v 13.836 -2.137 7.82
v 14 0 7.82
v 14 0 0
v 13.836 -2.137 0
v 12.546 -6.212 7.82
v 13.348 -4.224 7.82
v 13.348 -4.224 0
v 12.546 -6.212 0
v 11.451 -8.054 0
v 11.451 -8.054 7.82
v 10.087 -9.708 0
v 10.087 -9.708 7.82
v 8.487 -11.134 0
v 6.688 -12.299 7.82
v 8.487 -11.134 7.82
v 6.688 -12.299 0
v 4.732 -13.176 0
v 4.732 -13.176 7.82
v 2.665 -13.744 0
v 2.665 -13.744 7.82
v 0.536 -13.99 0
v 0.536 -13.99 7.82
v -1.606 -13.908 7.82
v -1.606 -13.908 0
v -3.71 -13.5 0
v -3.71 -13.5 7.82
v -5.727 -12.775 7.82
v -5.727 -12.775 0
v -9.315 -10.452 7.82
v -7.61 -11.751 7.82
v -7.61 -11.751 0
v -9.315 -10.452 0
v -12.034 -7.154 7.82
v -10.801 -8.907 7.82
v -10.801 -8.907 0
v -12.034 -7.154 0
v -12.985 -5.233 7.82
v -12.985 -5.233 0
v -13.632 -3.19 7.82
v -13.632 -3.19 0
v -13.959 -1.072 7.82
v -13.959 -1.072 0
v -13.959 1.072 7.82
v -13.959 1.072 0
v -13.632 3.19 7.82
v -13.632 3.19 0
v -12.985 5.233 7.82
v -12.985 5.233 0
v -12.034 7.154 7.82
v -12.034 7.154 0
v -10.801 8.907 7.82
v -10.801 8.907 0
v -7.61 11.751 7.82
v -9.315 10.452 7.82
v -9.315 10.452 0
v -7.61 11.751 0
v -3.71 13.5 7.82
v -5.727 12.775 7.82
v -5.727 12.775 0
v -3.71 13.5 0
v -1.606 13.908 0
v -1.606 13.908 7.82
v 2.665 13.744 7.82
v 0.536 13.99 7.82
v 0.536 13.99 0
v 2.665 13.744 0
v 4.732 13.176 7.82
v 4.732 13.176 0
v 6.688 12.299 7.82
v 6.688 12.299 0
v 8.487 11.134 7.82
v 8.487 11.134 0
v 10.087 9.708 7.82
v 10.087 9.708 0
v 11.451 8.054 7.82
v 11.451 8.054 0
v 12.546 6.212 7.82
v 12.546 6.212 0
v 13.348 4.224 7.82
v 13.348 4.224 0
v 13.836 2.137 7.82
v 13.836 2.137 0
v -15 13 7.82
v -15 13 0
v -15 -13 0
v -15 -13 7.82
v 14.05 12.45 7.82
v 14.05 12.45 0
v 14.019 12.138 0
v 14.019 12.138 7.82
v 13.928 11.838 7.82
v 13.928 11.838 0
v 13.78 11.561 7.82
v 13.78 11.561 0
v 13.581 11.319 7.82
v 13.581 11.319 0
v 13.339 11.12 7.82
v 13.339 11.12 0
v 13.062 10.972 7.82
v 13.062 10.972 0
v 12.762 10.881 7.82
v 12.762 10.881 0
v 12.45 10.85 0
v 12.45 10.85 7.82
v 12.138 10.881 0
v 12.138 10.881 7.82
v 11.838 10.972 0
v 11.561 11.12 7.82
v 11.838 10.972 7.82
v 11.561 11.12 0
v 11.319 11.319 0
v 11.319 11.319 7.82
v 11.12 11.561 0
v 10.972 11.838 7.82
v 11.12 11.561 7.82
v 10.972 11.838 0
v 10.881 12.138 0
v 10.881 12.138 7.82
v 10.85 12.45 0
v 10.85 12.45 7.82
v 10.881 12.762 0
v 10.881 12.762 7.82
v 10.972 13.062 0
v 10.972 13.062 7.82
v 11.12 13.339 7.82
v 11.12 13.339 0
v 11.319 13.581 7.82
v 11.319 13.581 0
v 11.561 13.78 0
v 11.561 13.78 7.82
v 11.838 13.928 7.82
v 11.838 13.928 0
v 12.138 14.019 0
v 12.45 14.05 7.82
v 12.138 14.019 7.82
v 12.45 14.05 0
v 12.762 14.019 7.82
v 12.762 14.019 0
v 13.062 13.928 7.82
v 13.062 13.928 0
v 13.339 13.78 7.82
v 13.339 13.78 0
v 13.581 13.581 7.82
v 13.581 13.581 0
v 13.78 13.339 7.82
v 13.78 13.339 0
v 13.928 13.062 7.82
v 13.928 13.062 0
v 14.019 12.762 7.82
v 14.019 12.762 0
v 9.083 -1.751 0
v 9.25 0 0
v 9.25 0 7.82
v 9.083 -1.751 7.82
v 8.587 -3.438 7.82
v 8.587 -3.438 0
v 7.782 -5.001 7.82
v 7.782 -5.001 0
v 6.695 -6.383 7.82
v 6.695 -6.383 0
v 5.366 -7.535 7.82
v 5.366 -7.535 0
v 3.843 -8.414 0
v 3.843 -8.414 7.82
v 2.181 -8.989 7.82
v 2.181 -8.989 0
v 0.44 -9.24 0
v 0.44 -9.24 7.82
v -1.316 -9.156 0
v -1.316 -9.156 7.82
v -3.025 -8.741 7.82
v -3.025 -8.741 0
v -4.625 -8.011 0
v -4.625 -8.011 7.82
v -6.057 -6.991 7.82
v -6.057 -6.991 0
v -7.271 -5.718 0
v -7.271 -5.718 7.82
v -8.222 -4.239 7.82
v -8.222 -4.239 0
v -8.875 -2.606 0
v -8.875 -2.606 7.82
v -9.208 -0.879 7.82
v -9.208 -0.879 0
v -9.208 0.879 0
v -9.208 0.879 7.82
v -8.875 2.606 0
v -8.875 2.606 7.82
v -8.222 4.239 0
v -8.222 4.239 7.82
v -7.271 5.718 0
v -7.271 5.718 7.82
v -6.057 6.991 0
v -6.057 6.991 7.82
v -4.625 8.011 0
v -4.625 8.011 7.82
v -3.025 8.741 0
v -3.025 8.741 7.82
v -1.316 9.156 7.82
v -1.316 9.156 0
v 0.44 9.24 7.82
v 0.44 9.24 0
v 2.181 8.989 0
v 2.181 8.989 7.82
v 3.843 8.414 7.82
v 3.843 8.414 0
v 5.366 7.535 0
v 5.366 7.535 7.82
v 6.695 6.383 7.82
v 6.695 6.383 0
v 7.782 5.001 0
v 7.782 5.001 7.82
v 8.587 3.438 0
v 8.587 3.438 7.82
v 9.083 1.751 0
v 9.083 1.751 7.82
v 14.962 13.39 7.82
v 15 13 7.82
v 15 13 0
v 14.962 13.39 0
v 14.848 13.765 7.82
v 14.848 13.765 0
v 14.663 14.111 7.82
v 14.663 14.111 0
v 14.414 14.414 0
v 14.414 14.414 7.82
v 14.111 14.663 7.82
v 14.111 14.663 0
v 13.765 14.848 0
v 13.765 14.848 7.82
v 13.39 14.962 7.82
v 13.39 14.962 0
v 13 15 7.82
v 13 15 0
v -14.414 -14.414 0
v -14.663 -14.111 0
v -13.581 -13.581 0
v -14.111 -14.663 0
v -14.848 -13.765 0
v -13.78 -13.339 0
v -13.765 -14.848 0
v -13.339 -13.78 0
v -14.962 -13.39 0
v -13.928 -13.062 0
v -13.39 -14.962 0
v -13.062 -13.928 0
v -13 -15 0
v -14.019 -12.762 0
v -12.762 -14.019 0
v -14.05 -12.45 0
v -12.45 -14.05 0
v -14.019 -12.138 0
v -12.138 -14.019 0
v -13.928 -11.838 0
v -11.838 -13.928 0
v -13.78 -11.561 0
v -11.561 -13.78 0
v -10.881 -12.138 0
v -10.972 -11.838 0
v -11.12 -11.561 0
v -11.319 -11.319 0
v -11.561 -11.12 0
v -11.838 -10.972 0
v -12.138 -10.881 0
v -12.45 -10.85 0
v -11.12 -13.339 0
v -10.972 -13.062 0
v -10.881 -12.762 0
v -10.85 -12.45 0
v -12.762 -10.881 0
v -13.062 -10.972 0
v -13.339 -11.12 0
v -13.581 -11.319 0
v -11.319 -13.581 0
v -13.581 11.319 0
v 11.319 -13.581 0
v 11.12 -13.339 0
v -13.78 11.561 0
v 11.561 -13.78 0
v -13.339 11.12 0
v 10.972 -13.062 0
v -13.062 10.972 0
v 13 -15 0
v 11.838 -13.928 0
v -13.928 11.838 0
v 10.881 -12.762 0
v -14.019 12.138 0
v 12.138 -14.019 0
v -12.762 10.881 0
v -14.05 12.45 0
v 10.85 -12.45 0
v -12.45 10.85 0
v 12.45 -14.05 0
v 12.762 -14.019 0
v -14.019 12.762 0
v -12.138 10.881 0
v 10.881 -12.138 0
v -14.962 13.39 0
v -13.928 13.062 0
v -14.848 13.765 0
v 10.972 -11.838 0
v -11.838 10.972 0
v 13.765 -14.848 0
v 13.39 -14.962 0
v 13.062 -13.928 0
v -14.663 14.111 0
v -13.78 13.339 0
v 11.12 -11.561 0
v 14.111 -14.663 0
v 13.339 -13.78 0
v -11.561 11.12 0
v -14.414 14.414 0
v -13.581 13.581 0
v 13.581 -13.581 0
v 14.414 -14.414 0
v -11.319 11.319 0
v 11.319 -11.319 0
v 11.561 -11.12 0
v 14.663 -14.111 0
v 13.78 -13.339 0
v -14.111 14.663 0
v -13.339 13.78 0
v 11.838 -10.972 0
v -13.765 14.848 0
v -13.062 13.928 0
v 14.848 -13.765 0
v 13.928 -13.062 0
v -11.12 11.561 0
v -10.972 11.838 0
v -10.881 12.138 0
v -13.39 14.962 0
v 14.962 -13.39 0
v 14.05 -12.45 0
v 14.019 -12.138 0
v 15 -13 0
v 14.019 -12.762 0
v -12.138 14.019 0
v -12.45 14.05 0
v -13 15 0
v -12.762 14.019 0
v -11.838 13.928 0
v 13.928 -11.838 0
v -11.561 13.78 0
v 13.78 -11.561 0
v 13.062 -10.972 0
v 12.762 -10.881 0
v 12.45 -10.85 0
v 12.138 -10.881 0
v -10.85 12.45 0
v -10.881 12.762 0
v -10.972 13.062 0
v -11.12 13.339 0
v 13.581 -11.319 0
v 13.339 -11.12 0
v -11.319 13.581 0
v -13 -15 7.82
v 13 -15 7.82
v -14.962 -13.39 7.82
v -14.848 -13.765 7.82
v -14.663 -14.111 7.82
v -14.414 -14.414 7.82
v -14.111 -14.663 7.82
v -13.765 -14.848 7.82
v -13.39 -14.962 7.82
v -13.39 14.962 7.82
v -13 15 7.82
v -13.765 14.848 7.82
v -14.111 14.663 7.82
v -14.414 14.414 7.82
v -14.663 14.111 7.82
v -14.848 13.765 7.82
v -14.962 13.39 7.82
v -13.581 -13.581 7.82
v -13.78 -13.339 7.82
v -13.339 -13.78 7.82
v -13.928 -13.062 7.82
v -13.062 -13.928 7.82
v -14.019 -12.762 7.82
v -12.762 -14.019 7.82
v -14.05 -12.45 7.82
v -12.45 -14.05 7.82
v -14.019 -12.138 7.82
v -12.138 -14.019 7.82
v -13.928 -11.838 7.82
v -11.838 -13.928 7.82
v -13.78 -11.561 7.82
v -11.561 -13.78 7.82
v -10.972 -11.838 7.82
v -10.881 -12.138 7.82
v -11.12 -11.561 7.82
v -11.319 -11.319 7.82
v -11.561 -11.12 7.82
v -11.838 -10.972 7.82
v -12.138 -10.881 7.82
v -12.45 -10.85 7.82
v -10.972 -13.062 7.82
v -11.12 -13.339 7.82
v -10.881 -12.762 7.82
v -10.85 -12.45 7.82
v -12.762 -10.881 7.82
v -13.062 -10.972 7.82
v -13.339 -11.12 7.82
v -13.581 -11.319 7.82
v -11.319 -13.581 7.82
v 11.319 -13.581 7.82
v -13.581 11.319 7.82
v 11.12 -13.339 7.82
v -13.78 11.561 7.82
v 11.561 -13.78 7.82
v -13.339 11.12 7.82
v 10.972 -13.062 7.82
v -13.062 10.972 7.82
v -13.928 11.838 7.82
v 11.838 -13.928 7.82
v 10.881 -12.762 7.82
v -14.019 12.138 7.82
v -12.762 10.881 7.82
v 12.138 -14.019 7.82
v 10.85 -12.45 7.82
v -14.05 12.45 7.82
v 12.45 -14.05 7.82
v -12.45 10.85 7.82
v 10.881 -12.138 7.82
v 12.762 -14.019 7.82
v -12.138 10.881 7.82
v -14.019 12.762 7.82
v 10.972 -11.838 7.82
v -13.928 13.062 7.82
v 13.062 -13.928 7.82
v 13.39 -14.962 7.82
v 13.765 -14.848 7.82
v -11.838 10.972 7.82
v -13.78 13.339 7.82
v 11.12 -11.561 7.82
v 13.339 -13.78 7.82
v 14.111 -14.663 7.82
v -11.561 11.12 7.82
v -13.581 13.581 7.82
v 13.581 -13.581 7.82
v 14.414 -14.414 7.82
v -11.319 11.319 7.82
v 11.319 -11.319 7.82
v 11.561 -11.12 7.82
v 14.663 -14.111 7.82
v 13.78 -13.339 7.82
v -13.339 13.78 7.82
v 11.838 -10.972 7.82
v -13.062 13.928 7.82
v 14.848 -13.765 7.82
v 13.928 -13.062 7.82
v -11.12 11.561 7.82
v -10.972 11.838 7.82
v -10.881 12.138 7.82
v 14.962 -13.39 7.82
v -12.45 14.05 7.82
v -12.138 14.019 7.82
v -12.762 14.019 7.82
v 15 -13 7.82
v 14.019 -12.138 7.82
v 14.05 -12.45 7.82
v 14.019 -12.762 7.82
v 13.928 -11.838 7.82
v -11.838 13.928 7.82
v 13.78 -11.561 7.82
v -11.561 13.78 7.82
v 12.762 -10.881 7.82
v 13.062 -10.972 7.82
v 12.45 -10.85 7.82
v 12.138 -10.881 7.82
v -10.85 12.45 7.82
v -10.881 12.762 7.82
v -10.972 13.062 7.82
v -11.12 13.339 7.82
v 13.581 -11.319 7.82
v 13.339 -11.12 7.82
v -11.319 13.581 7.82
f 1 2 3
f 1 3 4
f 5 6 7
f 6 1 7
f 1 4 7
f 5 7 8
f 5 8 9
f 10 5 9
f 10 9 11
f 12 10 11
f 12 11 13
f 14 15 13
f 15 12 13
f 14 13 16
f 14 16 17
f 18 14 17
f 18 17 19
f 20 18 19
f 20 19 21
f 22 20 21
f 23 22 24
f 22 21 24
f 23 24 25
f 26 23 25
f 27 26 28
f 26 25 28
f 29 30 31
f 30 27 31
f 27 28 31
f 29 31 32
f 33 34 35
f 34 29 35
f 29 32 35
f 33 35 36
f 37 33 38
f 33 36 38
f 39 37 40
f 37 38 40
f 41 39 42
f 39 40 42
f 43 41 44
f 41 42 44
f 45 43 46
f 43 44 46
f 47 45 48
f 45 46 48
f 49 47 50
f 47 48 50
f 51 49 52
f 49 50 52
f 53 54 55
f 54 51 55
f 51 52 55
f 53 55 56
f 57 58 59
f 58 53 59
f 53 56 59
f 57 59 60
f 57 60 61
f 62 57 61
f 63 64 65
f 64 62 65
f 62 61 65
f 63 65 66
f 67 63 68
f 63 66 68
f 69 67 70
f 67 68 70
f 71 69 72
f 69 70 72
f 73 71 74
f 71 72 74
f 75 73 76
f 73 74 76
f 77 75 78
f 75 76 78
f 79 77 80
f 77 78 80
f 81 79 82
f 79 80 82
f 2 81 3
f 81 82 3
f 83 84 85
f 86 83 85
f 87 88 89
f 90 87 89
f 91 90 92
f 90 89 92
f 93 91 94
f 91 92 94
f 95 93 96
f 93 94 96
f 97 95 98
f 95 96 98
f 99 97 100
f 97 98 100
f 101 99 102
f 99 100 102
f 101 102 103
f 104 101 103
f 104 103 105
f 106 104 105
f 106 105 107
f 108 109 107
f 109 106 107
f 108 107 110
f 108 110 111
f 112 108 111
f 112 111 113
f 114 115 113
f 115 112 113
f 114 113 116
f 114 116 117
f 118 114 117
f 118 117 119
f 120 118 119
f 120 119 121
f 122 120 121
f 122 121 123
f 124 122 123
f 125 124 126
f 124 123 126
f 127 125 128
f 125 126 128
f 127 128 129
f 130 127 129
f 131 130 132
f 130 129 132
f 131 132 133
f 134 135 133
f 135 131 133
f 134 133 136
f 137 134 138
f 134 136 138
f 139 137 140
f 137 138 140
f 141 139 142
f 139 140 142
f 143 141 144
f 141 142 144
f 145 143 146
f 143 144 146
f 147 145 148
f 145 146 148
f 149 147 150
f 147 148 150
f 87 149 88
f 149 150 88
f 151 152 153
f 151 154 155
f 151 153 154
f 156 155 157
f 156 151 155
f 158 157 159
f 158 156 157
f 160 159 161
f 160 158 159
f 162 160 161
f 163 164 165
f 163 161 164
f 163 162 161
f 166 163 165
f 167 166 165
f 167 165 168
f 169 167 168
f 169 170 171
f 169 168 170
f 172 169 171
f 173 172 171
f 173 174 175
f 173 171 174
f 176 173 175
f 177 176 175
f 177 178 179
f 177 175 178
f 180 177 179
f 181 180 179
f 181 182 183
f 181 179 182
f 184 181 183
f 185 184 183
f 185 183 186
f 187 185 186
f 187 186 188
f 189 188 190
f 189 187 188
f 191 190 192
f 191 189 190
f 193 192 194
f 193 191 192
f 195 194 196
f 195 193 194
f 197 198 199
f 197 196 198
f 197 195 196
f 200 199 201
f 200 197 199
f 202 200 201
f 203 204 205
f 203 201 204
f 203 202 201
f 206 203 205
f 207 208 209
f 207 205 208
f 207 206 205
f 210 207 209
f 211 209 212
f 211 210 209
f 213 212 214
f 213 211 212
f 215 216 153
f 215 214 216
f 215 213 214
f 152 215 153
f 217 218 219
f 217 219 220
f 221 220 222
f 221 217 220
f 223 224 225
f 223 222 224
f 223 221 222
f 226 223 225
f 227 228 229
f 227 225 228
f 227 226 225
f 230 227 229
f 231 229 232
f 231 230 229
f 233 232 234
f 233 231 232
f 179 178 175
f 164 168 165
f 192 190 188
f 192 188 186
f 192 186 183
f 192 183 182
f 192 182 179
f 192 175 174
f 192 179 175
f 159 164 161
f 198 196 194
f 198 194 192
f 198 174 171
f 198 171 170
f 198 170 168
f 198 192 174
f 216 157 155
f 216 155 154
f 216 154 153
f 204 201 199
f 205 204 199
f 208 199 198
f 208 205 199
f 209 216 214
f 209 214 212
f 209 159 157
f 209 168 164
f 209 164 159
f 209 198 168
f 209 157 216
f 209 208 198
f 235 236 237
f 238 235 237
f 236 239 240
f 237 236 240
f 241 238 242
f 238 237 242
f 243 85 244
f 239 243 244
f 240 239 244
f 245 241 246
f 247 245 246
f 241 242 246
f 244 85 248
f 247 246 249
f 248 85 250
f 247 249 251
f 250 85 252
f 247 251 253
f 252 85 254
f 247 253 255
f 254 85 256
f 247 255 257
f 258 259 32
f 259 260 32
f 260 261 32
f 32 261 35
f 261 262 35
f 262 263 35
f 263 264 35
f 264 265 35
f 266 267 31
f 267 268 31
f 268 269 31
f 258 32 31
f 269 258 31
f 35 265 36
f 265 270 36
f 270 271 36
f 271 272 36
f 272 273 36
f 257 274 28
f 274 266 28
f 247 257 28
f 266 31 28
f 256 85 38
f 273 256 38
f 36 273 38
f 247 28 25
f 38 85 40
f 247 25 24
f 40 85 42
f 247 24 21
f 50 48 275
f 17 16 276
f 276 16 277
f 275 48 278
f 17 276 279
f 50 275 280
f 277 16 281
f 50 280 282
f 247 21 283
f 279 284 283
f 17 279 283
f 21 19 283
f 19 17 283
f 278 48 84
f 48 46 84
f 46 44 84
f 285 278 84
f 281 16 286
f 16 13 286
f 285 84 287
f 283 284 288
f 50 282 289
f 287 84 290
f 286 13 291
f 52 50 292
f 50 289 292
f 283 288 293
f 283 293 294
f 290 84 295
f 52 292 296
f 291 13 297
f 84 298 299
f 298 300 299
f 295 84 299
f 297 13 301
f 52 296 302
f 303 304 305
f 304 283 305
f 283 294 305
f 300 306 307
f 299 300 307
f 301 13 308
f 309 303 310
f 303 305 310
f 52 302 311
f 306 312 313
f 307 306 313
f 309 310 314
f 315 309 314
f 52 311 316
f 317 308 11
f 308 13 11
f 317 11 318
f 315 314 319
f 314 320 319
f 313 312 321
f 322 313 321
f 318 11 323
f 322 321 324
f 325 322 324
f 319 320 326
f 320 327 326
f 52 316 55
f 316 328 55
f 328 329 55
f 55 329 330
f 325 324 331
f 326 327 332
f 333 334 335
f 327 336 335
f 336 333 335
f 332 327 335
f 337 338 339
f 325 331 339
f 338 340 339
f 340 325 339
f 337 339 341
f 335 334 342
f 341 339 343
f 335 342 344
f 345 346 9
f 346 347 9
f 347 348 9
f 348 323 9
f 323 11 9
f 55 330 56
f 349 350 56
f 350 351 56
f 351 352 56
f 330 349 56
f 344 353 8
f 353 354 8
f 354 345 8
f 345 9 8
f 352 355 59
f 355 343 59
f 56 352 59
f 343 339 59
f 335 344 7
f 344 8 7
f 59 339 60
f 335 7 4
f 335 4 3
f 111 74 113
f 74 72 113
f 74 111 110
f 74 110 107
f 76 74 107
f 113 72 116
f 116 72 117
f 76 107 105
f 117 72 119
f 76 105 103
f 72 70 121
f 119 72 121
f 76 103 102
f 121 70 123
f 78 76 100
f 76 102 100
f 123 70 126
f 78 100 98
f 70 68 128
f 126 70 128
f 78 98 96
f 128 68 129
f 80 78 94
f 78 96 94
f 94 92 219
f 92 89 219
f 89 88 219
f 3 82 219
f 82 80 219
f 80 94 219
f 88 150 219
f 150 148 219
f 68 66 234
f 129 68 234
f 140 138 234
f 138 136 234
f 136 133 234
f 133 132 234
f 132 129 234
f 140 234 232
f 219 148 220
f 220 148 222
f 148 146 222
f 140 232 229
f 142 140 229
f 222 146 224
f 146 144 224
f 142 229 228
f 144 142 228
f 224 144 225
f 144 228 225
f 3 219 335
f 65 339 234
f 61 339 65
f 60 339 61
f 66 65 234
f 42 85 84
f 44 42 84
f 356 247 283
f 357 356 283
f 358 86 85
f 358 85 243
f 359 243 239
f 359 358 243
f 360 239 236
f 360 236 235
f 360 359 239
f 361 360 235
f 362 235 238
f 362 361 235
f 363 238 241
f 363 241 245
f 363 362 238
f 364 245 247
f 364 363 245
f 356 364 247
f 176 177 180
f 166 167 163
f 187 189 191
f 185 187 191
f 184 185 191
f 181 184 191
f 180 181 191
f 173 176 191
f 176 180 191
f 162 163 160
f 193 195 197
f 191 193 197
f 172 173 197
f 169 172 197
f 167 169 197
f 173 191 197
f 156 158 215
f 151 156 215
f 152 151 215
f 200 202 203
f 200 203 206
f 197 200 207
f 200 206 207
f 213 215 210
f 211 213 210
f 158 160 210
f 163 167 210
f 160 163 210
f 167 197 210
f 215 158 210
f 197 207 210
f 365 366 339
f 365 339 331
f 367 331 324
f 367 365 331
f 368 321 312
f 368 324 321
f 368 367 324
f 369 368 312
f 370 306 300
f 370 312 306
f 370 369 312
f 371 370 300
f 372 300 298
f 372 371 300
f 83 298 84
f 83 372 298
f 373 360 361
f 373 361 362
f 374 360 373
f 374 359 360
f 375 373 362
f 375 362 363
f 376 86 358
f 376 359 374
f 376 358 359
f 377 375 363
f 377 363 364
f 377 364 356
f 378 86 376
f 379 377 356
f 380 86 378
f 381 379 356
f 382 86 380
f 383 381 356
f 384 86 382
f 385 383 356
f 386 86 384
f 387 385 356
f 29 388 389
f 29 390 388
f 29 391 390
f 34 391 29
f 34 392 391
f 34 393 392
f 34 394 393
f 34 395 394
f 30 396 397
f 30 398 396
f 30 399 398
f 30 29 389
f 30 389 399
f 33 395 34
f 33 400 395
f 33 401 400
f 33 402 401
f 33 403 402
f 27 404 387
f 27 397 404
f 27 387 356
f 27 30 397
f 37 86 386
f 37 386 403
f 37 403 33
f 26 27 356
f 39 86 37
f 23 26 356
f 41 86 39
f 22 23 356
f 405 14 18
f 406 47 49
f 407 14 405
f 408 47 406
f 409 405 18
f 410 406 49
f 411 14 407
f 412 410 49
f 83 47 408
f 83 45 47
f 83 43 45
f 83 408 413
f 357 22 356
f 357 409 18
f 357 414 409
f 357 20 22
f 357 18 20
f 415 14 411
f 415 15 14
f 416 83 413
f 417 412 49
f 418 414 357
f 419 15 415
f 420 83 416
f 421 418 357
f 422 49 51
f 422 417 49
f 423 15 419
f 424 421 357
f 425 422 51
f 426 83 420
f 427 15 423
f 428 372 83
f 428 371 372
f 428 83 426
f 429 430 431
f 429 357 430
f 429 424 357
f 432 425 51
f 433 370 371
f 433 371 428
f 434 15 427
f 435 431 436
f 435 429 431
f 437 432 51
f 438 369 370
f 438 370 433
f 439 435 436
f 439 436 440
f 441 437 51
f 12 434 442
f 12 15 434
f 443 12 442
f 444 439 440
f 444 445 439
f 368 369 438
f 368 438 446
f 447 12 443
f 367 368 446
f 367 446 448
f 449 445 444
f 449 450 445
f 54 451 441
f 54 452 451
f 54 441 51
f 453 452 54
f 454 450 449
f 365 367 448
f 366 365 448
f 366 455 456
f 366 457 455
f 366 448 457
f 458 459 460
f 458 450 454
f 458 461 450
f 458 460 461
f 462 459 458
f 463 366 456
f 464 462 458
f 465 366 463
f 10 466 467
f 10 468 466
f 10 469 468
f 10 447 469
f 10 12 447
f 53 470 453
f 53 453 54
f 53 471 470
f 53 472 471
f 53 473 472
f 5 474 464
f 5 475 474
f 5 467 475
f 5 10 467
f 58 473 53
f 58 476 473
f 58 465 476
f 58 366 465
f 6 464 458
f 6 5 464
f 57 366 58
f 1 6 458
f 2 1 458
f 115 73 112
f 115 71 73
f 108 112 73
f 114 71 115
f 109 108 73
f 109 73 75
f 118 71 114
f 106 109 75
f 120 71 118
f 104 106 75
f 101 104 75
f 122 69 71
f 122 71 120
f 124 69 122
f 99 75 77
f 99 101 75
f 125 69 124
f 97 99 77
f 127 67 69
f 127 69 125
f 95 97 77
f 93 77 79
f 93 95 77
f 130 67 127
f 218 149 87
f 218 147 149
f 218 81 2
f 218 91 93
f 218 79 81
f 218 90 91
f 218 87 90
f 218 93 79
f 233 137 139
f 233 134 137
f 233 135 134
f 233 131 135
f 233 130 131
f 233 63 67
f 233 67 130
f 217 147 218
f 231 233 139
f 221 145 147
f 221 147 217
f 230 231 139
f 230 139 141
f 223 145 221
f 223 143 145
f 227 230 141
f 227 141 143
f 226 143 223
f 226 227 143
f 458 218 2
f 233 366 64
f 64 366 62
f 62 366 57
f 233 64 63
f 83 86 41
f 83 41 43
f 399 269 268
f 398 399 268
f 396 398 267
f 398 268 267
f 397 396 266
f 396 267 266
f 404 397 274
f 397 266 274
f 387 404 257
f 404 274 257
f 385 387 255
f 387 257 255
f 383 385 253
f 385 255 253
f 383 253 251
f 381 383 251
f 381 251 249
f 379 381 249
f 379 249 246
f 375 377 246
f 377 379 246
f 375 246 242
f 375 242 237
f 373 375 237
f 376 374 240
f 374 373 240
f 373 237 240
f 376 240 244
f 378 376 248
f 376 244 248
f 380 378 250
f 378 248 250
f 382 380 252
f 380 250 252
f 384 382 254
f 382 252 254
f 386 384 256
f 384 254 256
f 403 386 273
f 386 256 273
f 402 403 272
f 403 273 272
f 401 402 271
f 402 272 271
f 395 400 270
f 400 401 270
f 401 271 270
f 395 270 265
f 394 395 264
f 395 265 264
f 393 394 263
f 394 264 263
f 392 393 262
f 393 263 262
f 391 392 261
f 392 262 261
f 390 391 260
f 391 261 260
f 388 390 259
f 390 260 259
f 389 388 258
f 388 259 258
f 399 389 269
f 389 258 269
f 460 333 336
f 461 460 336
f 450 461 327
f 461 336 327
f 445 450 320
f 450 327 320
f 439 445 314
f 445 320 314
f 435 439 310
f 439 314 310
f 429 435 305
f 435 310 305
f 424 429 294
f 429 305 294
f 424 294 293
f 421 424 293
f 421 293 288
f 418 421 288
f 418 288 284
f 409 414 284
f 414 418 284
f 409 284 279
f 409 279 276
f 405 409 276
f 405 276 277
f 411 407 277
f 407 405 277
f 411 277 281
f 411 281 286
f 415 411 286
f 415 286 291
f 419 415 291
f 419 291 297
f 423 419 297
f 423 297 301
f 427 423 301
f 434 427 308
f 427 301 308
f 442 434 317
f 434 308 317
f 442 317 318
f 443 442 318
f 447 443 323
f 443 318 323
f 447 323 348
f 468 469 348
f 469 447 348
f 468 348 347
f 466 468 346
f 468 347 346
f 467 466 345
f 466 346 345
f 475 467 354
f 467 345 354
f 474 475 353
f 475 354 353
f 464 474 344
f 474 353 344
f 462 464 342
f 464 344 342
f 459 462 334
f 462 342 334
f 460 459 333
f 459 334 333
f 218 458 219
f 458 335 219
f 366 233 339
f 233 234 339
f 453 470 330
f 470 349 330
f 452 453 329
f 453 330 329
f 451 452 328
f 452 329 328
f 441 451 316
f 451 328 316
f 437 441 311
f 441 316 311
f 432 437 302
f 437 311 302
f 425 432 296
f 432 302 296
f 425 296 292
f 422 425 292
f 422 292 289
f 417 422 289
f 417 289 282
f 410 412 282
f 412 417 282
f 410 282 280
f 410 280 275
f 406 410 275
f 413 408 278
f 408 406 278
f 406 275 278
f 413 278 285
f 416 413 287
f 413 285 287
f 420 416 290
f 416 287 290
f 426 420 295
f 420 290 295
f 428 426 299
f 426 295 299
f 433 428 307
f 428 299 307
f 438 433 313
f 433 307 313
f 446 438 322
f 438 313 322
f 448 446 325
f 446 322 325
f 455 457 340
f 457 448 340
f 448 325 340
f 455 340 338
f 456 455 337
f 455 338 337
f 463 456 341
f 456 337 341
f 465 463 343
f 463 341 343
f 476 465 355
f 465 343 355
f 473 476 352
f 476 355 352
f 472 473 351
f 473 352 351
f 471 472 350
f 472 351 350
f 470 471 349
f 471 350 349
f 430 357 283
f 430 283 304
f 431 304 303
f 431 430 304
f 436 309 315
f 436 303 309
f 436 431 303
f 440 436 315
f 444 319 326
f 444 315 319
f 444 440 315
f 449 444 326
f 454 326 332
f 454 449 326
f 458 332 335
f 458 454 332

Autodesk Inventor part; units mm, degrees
ref_plane "YZ Plane" through (0, 0, 0) normal (1, 0, 0) x (0, 1, 0)
ref_plane "XZ Plane" through (0, 0, 0) normal (0, 1, 0) x (-1, 0, 0)
ref_plane "XY Plane" through (0, 0, 0) normal (0, 0, 1) x (1, 0, 0)
sketch "Sketch1" plane through (0, 0, 0) normal (0, 0, 1) x (1, 0, 0)
  line L0 (-15, -15) -> (15, -15)
  line L1 (15, -15) -> (15, 15)
  line L2 (15, 15) -> (-15, 15)
  line L3 (-15, 15) -> (-15, -15)
  line L4 (-15, -15) -> (15, 15) construction
  line L5 (15, -15) -> (-15, 15) construction
  circle A0 centre (-12.45, 12.45) radius 1.6
  line L6 (0, 15) -> (0, 0) construction
  line L7 (0, 0) -> (-15, 0) construction
  circle A1 centre (12.45, 12.45) radius 1.6
  circle A2 centre (-12.45, -12.45) radius 1.6
  circle A3 centre (12.45, -12.45) radius 1.6
  circle A4 centre (0, 0) radius 14
  circle A5 centre (0, 0) radius 9.25
  dimension "d0" = 30
  dimension "d1" = 30
  dimension "d2" = 3.2
  dimension "d3" = 2.55
  dimension "d4" = 2.55
  dimension "d5" = 28
  dimension "d6" = 18.5
extrude "Extrusion1" add sketch "Sketch1" along normal blind 7.82
fillet "Fillet1" radius 2 4 edges at (15, 15, 3.91) (-15, 15, 3.91) (-15, -15, 3.91) (15, -15, 3.91)
equation "\"d4\" = d3"
properties part number "Fan"
